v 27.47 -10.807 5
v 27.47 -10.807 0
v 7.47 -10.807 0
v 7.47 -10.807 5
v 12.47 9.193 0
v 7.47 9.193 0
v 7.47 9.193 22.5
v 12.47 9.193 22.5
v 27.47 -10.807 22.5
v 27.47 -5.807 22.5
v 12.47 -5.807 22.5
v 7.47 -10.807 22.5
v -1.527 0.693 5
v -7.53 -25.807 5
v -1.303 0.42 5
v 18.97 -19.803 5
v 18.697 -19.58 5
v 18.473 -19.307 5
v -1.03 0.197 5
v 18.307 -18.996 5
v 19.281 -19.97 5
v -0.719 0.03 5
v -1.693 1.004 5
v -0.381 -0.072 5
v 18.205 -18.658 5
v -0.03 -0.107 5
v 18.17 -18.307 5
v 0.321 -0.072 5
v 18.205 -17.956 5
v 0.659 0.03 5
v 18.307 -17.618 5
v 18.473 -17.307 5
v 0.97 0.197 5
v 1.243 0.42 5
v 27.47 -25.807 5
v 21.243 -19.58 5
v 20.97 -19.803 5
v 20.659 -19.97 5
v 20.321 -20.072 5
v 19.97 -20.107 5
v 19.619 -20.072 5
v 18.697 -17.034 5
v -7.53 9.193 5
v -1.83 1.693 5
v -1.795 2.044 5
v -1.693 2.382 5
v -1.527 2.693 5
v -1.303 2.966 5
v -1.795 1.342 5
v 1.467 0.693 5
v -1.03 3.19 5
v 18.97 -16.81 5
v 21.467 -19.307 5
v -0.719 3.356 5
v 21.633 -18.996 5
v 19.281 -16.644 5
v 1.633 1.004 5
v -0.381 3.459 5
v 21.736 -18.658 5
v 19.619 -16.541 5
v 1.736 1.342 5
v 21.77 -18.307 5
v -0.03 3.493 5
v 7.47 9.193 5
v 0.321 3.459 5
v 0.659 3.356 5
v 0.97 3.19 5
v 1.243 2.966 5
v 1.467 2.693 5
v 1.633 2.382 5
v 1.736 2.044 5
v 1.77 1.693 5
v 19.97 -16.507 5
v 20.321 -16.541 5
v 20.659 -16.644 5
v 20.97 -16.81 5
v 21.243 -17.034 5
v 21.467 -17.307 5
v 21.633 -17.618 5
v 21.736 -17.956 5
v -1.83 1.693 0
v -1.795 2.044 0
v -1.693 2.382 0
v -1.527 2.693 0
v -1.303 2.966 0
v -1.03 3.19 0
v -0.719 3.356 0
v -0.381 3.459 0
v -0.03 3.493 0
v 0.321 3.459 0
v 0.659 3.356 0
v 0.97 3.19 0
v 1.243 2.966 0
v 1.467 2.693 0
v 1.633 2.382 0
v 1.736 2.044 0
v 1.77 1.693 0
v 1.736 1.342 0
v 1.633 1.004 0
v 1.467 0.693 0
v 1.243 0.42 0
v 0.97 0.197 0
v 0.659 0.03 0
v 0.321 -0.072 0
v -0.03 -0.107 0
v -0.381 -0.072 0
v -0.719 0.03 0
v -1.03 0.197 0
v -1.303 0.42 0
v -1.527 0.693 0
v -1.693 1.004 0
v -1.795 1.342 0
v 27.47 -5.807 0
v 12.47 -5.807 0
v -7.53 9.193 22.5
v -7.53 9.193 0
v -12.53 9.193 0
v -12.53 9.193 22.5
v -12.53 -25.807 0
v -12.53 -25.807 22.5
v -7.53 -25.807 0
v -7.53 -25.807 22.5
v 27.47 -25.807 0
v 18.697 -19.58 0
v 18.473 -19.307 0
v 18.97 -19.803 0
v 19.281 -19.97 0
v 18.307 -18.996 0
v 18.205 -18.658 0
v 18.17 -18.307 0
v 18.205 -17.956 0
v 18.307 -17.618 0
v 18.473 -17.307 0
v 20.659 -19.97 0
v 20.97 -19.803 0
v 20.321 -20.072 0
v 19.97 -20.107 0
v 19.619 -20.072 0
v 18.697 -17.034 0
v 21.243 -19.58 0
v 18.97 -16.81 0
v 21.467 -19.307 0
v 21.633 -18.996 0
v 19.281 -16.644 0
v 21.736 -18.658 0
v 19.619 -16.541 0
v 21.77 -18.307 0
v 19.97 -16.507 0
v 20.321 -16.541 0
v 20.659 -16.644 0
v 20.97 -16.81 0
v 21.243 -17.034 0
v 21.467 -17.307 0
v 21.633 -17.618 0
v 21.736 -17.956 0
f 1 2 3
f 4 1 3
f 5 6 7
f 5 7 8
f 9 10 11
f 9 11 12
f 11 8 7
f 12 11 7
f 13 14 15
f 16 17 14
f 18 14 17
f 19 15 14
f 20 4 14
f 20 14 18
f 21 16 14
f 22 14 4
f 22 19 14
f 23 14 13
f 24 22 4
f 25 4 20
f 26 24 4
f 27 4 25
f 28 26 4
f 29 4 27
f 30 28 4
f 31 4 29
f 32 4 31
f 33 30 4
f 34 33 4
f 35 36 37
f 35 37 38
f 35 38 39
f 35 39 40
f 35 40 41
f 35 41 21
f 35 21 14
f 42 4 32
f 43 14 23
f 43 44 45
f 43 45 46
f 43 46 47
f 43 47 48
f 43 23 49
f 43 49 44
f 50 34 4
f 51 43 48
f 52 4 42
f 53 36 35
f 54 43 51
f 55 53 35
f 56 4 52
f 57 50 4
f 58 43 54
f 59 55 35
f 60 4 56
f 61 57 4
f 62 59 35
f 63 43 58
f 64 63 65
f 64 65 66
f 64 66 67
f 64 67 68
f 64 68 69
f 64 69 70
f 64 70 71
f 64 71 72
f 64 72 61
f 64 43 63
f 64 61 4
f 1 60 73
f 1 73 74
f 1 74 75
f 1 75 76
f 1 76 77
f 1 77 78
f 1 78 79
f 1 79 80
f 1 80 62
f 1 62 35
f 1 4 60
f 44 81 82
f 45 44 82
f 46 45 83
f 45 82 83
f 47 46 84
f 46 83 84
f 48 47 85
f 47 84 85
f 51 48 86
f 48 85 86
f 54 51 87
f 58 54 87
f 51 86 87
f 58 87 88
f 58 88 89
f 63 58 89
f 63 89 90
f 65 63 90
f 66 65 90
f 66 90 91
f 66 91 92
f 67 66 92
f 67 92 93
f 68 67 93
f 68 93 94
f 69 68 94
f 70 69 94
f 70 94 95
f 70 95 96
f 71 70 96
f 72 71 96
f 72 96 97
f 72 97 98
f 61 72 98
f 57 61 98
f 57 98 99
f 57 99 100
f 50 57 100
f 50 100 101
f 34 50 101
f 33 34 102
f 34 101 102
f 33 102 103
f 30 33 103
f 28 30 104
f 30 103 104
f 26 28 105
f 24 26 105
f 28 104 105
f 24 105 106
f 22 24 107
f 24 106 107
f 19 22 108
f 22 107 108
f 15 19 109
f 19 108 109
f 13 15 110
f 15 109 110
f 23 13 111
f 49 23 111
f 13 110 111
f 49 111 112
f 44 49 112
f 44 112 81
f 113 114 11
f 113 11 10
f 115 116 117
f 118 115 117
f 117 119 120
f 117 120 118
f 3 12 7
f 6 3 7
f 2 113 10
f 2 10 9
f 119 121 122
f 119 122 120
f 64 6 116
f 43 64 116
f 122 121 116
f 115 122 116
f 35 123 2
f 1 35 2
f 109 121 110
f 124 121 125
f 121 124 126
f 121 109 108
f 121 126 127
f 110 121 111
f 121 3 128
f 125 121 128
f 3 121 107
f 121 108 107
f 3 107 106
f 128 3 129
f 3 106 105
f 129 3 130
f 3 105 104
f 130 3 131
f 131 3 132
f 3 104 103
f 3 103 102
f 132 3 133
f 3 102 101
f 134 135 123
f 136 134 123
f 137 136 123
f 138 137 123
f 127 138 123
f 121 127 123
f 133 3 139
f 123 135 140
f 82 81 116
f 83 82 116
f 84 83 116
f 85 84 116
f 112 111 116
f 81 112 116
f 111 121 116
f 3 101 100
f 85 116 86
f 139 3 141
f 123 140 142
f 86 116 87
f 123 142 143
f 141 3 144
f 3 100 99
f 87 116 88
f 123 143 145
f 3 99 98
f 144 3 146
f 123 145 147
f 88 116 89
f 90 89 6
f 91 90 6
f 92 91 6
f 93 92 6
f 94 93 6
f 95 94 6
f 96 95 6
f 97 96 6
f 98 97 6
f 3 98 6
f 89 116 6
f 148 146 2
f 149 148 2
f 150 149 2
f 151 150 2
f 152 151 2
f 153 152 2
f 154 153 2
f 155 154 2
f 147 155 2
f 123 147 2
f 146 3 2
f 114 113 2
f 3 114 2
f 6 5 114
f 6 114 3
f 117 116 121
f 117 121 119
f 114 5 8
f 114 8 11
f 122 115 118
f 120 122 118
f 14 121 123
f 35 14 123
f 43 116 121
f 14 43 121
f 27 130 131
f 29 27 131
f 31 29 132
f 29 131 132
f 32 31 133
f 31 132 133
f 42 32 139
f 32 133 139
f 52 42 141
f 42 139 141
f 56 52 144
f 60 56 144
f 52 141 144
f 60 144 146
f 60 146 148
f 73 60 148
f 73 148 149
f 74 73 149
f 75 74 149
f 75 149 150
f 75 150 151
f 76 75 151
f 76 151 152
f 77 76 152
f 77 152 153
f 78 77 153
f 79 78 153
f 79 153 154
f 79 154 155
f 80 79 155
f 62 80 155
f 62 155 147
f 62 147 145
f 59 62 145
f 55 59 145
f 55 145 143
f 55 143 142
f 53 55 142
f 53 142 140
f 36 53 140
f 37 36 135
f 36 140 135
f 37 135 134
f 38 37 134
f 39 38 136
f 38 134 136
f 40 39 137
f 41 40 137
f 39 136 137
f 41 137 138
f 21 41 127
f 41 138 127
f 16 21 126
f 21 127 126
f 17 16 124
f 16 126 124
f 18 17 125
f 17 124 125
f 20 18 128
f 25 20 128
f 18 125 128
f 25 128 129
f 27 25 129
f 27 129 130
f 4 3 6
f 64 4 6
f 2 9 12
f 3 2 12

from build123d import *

# Parameters (mm, degrees)
BOSS_EXTRUDE1_DEPTH = 5
BOSS_EXTRUDE2_DEPTH = 22.5
SKETCH3_W           = 5
SKETCH3_H           = 35
BOSS_EXTRUDE3_DEPTH = 22.5
SKETCH4_R           = 1.8
CUT_EXTRUDE1_DEPTH  = 23.5


with BuildPart() as part:
    # Sketch1 → Boss-Extrude1 (new body)
    with BuildSketch(Plane.XY):
        Polygon((-7.529880478, -25.806772908), (27.470119522, -25.806772908), (27.470119522, -10.806772908), (7.470119522, -10.806772908), (7.470119522, 9.193227092), (-7.529880478, 9.193227092), align=None)
    extrude(amount=BOSS_EXTRUDE1_DEPTH)

    # Sketch4 → Cut-Extrude1 (cut, through all)
    with BuildSketch(Plane(origin=(0, 0, 0), x_dir=(-1, 0, 0), z_dir=(0, 0, -1))):
        with Locations((0.029880478, 1.693227092)):
            Circle(SKETCH4_R)
        with Locations((-19.970119522, -18.306772908)):
            Circle(SKETCH4_R)
    extrude(amount=-CUT_EXTRUDE1_DEPTH, mode=Mode.SUBTRACT)


with BuildPart() as body_2:
    # Sketch2 → Boss-Extrude2 (new body)
    with BuildSketch(Plane(origin=(0, 0, 0), x_dir=(-1, 0, 0), z_dir=(0, 0, -1))):
        Polygon((-7.470119522, 9.193227092), (-12.470119522, 9.193227092), (-12.470119522, -5.806772908), (-27.470119522, -5.806772908), (-27.470119522, -10.806772908), (-7.470119522, -10.806772908), align=None)
    extrude(amount=-BOSS_EXTRUDE2_DEPTH)


with BuildPart() as body_3:
    # Sketch3 → Boss-Extrude3 (new body)
    with BuildSketch(Plane(origin=(0, 0, 0), x_dir=(-1, 0, 0), z_dir=(0, 0, -1))):
        with Locations((10.029880478, -8.306772908)):
            Rectangle(SKETCH3_W, SKETCH3_H)
    extrude(amount=-BOSS_EXTRUDE3_DEPTH)


solid = Compound([part.part, body_2.part, body_3.part])
